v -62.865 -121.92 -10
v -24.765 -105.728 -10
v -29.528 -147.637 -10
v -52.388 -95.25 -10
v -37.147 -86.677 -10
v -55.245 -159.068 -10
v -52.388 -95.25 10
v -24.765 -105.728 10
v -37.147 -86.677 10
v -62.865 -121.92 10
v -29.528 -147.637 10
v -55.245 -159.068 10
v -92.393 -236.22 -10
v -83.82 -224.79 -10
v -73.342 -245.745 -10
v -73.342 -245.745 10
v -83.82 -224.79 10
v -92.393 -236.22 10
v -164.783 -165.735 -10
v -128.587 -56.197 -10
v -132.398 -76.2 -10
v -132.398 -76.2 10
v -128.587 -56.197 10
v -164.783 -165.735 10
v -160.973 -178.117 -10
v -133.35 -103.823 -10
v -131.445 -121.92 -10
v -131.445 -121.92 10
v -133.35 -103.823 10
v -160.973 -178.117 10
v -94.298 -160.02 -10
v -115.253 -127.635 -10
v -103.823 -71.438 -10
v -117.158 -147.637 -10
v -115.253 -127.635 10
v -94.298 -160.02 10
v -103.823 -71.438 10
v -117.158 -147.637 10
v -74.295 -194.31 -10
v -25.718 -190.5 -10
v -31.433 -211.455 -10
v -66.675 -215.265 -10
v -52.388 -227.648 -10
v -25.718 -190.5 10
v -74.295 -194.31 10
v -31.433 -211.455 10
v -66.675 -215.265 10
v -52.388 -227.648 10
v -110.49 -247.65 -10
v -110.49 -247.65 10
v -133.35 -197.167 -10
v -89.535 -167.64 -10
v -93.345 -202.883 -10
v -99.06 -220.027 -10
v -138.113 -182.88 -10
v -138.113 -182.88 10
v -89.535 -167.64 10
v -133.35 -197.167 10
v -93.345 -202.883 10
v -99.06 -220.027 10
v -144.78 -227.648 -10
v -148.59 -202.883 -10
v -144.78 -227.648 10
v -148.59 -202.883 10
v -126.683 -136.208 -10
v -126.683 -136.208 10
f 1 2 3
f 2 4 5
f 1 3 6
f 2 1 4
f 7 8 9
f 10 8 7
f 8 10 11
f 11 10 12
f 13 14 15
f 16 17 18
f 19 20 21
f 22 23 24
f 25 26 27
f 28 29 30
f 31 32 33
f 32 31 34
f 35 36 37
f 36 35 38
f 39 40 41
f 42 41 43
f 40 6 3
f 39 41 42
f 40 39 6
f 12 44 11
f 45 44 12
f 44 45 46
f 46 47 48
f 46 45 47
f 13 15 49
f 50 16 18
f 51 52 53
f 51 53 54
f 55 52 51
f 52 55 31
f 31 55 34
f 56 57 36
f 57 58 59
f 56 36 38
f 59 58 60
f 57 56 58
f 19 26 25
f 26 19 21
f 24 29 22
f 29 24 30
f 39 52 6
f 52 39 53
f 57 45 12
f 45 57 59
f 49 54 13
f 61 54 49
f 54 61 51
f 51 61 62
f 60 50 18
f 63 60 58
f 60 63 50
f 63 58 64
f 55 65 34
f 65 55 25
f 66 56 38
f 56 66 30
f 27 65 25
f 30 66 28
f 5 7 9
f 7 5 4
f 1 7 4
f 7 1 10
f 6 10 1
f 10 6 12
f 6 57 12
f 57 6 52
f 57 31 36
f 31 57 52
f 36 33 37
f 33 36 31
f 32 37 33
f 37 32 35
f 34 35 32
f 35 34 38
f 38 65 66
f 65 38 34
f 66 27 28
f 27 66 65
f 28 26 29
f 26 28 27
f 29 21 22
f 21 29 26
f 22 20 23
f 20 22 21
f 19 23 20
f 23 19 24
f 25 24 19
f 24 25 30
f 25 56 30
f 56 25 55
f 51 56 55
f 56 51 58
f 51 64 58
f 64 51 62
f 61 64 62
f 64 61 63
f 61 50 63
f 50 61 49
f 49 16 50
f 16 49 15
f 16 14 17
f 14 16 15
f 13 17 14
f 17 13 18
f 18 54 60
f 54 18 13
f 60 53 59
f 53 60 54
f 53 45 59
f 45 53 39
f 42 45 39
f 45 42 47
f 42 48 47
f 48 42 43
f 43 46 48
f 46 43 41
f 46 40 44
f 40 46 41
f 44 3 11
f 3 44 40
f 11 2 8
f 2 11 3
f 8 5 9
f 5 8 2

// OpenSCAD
polyhedron(
    points=[
    [-37.1475, -86.6775, -10],
    [-52.3875, -95.25, -10],
    [-62.865, -121.92, -10],
    [-55.245, -159.0675, -10],
    [-89.535, -167.64, -10],
    [-94.2975, -160.02, -10],
    [-103.8225, -71.4375, -10],
    [-115.2525, -127.635, -10],
    [-117.1575, -147.6375, -10],
    [-126.6825, -136.2075, -10],
    [-131.445, -121.92, -10],
    [-133.35, -103.8225, -10],
    [-132.3975, -76.2, -10],
    [-128.5875, -56.1975, -10],
    [-164.7825, -165.735, -10],
    [-160.9725, -178.1175, -10],
    [-138.1125, -182.88, -10],
    [-133.35, -197.1675, -10],
    [-148.59, -202.8825, -10],
    [-144.78, -227.6475, -10],
    [-110.49, -247.65, -10],
    [-73.3425, -245.745, -10],
    [-83.82, -224.79, -10],
    [-92.3925, -236.22, -10],
    [-99.06, -220.0275, -10],
    [-93.345, -202.8825, -10],
    [-74.295, -194.31, -10],
    [-66.675, -215.265, -10],
    [-52.3875, -227.6475, -10],
    [-31.4325, -211.455, -10],
    [-25.7175, -190.5, -10],
    [-29.5275, -147.6375, -10],
    [-24.765, -105.7275, -10],
    [-37.1475, -86.6775, 10],
    [-52.3875, -95.25, 10],
    [-62.865, -121.92, 10],
    [-55.245, -159.0675, 10],
    [-89.535, -167.64, 10],
    [-94.2975, -160.02, 10],
    [-103.8225, -71.4375, 10],
    [-115.2525, -127.635, 10],
    [-117.1575, -147.6375, 10],
    [-126.6825, -136.2075, 10],
    [-131.445, -121.92, 10],
    [-133.35, -103.8225, 10],
    [-132.3975, -76.2, 10],
    [-128.5875, -56.1975, 10],
    [-164.7825, -165.735, 10],
    [-160.9725, -178.1175, 10],
    [-138.1125, -182.88, 10],
    [-133.35, -197.1675, 10],
    [-148.59, -202.8825, 10],
    [-144.78, -227.6475, 10],
    [-110.49, -247.65, 10],
    [-73.3425, -245.745, 10],
    [-83.82, -224.79, 10],
    [-92.3925, -236.22, 10],
    [-99.06, -220.0275, 10],
    [-93.345, -202.8825, 10],
    [-74.295, -194.31, 10],
    [-66.675, -215.265, 10],
    [-52.3875, -227.6475, 10],
    [-31.4325, -211.455, 10],
    [-25.7175, -190.5, 10],
    [-29.5275, -147.6375, 10],
    [-24.765, -105.7275, 10],
    ],
    faces=[
        [31,32,0,1,2,3],
        [36,35,34,33,65,64],
        [21,22,23],
        [56,55,54],
        [12,13,14],
        [47,46,45],
        [10,11,15],
        [48,44,43],
        [5,6,7,8],
        [41,40,39,38],
        [26,27,28,29,30,31,3],
        [36,64,63,62,61,60,59],
        [20,21,23],
        [56,54,53],
        [16,17,24,25,4,5,8],
        [41,38,37,58,57,50,49],
        [11,12,14,15],
        [48,47,45,44],
        [25,26,3,4],
        [37,36,59,58],
        [17,18,19,20,23,24],
        [57,56,53,52,51,50],
        [8,9,15,16],
        [49,48,42,41],
        [15,9,10],
        [43,42,48],
        [0,33,34,1],
        [1,34,35,2],
        [2,35,36,3],
        [3,36,37,4],
        [4,37,38,5],
        [5,38,39,6],
        [6,39,40,7],
        [7,40,41,8],
        [8,41,42,9],
        [9,42,43,10],
        [10,43,44,11],
        [11,44,45,12],
        [12,45,46,13],
        [13,46,47,14],
        [14,47,48,15],
        [15,48,49,16],
        [16,49,50,17],
        [17,50,51,18],
        [18,51,52,19],
        [19,52,53,20],
        [20,53,54,21],
        [21,54,55,22],
        [22,55,56,23],
        [23,56,57,24],
        [24,57,58,25],
        [25,58,59,26],
        [26,59,60,27],
        [27,60,61,28],
        [28,61,62,29],
        [29,62,63,30],
        [30,63,64,31],
        [31,64,65,32],
        [32,65,33,0],
    ]
);
